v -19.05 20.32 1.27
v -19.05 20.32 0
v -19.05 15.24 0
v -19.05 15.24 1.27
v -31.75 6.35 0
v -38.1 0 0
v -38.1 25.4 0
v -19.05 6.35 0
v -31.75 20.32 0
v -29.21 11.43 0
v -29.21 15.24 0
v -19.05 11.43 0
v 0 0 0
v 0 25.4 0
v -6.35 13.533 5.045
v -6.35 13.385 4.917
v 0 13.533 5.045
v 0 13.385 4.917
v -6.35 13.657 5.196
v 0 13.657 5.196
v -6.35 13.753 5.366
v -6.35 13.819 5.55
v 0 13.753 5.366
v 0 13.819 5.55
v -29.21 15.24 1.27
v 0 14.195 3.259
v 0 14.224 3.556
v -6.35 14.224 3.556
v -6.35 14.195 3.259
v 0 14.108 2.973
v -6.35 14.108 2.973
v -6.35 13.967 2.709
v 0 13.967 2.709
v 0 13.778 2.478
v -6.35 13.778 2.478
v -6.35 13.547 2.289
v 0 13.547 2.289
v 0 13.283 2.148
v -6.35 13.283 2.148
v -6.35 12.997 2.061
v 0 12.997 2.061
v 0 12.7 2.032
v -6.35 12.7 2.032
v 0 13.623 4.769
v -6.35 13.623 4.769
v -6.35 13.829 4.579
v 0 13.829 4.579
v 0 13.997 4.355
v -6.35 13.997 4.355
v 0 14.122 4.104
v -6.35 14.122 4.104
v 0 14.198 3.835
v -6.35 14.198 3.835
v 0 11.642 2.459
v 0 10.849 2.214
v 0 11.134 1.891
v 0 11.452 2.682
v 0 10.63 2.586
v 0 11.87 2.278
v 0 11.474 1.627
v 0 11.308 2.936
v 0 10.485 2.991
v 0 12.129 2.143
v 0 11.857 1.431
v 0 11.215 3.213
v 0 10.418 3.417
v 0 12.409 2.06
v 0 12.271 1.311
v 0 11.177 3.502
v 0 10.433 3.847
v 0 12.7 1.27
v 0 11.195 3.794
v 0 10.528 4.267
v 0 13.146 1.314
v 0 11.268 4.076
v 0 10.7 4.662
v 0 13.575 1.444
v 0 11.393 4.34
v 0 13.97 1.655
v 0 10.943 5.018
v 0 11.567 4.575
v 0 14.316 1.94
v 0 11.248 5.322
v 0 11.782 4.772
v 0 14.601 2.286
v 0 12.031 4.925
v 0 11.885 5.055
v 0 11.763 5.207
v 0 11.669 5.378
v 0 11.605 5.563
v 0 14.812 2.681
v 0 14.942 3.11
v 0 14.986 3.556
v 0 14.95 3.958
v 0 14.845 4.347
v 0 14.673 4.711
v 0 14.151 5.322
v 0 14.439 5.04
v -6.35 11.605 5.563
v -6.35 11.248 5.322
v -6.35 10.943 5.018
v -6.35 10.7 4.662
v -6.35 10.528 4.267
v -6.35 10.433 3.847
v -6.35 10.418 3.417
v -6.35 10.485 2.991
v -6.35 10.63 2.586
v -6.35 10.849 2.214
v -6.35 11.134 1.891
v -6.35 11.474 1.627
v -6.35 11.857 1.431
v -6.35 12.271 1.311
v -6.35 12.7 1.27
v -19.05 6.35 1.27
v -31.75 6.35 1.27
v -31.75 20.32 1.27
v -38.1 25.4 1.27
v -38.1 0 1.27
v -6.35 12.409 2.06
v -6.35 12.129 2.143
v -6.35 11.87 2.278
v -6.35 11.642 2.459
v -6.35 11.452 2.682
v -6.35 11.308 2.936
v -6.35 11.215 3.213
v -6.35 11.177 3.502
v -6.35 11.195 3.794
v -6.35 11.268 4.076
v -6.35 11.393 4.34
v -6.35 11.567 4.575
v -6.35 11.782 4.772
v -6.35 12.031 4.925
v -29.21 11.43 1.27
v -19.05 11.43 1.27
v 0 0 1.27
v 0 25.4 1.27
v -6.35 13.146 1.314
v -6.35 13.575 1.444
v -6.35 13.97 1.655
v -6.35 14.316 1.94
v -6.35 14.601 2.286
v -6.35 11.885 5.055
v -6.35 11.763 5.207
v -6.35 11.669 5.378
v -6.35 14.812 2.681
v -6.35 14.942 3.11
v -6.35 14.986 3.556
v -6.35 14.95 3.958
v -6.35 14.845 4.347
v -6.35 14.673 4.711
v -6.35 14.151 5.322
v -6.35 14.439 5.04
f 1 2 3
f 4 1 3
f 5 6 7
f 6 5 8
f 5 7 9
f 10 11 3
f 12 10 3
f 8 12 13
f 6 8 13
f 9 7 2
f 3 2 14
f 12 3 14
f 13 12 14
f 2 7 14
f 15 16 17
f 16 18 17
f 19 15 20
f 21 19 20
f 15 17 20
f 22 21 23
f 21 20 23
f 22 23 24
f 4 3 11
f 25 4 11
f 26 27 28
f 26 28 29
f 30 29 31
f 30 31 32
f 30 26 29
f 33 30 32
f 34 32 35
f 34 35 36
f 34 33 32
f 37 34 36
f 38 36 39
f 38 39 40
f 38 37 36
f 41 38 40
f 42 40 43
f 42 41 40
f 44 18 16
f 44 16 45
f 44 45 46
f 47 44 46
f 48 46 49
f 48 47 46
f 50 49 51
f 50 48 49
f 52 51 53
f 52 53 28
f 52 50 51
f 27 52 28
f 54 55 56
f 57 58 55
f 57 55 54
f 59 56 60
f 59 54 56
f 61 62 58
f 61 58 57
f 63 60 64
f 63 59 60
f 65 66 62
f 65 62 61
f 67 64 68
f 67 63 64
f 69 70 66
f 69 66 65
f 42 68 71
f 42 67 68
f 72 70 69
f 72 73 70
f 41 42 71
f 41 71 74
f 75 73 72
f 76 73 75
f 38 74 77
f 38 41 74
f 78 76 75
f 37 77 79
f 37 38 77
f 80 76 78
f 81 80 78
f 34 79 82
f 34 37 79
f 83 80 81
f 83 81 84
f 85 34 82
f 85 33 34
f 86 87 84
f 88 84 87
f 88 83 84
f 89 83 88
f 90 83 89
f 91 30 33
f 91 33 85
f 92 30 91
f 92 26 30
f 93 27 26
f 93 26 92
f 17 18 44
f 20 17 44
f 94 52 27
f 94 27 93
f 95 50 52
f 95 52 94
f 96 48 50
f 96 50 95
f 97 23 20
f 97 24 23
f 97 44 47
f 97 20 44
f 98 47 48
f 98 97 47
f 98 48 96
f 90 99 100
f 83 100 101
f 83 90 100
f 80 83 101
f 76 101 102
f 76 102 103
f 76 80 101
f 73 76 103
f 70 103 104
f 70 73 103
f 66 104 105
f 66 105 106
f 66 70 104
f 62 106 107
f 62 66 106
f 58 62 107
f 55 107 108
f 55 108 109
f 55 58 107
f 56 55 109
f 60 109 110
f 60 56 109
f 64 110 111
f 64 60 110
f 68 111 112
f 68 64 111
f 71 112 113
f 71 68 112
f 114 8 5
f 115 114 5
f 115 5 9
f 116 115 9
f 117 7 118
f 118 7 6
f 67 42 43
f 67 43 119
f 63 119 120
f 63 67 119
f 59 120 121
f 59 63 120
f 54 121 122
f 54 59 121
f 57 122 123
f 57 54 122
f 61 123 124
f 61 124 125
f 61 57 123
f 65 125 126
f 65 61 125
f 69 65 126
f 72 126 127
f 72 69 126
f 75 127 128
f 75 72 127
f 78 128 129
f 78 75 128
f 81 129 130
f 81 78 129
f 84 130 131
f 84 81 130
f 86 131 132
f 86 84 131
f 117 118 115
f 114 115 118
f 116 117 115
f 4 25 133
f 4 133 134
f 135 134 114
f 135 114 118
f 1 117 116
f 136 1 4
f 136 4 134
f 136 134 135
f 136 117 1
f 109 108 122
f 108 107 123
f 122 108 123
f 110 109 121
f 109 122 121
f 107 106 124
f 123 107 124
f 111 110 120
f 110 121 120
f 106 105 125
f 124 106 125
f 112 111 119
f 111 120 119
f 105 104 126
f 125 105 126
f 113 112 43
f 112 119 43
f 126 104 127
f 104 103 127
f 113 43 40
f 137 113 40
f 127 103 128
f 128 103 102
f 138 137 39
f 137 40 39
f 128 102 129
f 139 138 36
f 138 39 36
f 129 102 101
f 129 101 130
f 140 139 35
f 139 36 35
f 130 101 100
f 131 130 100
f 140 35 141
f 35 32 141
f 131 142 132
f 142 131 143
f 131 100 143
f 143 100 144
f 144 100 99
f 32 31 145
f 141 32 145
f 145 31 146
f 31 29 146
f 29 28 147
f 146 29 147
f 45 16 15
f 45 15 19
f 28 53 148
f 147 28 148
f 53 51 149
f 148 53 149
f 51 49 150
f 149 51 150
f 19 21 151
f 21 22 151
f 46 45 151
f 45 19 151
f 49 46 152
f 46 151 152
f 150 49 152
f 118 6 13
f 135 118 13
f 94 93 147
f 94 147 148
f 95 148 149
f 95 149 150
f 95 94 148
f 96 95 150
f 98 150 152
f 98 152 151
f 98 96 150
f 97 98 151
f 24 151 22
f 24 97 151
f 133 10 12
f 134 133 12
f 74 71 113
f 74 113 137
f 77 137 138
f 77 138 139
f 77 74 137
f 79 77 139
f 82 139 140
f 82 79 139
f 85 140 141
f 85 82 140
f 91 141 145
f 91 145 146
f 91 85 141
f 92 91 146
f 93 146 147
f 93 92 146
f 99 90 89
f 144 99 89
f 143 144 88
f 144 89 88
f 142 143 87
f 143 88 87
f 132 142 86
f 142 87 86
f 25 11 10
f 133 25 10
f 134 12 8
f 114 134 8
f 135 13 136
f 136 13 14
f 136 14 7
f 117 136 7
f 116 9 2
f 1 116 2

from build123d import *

# Parameters (mm, degrees)
F1_DEPTH = 1.27
F3_DEPTH = 6.35
F5_D     = 2.286
F5_DEPTH = 25.4


with BuildPart() as f1:
    # F0 (on Top) → F1 (new body)
    with BuildSketch(Plane.XY):
        Polygon((-25.4, 0), (0, 0), (0, 25.4), (-25.4, 25.4), (-38.1, 25.4), (-38.1, 0), align=None)
        Polygon((-31.75, 20.32), (-25.4, 20.32), (-19.05, 20.32), (-19.05, 15.24), (-29.21, 15.24), (-29.21, 11.43), (-19.05, 11.43), (-19.05, 6.35), (-25.4, 6.35), (-31.75, 6.35), align=None, mode=Mode.SUBTRACT)
    extrude(amount=F1_DEPTH)


with BuildPart() as f3:
    # F2 (on Right) → F3 (new body)
    with BuildSketch(Plane.YZ):
        with BuildLine():
            ThreePointArc((14.224, 3.556), (11.622369, 4.633631), (12.7, 2.032))
            ThreePointArc((12.7, 2.032), (13.777631, 2.478369), (14.224, 3.556))
        make_face()
        with BuildLine():
            ThreePointArc((14.986, 3.556), (11.083554, 5.172446), (12.7, 1.27))
            ThreePointArc((12.7, 1.27), (14.316446, 1.939554), (14.986, 3.556))
        make_face()
        with BuildLine():
            ThreePointArc((14.224, 3.556), (13.777631, 2.478369), (12.7, 2.032))
            ThreePointArc((12.7, 2.032), (11.622369, 4.633631), (14.224, 3.556))
        make_face(mode=Mode.SUBTRACT)
    extrude(amount=-F3_DEPTH)

    # F5
    with Locations(Plane(origin=(-6.35, 0, 0), x_dir=(0, -1, 0), z_dir=(-1, 0, 0))):
        with Locations((-12.713505, 5.84196)):
            Hole(F5_D / 2, depth=F5_DEPTH)


solid = Compound([f1.part, f3.part])
